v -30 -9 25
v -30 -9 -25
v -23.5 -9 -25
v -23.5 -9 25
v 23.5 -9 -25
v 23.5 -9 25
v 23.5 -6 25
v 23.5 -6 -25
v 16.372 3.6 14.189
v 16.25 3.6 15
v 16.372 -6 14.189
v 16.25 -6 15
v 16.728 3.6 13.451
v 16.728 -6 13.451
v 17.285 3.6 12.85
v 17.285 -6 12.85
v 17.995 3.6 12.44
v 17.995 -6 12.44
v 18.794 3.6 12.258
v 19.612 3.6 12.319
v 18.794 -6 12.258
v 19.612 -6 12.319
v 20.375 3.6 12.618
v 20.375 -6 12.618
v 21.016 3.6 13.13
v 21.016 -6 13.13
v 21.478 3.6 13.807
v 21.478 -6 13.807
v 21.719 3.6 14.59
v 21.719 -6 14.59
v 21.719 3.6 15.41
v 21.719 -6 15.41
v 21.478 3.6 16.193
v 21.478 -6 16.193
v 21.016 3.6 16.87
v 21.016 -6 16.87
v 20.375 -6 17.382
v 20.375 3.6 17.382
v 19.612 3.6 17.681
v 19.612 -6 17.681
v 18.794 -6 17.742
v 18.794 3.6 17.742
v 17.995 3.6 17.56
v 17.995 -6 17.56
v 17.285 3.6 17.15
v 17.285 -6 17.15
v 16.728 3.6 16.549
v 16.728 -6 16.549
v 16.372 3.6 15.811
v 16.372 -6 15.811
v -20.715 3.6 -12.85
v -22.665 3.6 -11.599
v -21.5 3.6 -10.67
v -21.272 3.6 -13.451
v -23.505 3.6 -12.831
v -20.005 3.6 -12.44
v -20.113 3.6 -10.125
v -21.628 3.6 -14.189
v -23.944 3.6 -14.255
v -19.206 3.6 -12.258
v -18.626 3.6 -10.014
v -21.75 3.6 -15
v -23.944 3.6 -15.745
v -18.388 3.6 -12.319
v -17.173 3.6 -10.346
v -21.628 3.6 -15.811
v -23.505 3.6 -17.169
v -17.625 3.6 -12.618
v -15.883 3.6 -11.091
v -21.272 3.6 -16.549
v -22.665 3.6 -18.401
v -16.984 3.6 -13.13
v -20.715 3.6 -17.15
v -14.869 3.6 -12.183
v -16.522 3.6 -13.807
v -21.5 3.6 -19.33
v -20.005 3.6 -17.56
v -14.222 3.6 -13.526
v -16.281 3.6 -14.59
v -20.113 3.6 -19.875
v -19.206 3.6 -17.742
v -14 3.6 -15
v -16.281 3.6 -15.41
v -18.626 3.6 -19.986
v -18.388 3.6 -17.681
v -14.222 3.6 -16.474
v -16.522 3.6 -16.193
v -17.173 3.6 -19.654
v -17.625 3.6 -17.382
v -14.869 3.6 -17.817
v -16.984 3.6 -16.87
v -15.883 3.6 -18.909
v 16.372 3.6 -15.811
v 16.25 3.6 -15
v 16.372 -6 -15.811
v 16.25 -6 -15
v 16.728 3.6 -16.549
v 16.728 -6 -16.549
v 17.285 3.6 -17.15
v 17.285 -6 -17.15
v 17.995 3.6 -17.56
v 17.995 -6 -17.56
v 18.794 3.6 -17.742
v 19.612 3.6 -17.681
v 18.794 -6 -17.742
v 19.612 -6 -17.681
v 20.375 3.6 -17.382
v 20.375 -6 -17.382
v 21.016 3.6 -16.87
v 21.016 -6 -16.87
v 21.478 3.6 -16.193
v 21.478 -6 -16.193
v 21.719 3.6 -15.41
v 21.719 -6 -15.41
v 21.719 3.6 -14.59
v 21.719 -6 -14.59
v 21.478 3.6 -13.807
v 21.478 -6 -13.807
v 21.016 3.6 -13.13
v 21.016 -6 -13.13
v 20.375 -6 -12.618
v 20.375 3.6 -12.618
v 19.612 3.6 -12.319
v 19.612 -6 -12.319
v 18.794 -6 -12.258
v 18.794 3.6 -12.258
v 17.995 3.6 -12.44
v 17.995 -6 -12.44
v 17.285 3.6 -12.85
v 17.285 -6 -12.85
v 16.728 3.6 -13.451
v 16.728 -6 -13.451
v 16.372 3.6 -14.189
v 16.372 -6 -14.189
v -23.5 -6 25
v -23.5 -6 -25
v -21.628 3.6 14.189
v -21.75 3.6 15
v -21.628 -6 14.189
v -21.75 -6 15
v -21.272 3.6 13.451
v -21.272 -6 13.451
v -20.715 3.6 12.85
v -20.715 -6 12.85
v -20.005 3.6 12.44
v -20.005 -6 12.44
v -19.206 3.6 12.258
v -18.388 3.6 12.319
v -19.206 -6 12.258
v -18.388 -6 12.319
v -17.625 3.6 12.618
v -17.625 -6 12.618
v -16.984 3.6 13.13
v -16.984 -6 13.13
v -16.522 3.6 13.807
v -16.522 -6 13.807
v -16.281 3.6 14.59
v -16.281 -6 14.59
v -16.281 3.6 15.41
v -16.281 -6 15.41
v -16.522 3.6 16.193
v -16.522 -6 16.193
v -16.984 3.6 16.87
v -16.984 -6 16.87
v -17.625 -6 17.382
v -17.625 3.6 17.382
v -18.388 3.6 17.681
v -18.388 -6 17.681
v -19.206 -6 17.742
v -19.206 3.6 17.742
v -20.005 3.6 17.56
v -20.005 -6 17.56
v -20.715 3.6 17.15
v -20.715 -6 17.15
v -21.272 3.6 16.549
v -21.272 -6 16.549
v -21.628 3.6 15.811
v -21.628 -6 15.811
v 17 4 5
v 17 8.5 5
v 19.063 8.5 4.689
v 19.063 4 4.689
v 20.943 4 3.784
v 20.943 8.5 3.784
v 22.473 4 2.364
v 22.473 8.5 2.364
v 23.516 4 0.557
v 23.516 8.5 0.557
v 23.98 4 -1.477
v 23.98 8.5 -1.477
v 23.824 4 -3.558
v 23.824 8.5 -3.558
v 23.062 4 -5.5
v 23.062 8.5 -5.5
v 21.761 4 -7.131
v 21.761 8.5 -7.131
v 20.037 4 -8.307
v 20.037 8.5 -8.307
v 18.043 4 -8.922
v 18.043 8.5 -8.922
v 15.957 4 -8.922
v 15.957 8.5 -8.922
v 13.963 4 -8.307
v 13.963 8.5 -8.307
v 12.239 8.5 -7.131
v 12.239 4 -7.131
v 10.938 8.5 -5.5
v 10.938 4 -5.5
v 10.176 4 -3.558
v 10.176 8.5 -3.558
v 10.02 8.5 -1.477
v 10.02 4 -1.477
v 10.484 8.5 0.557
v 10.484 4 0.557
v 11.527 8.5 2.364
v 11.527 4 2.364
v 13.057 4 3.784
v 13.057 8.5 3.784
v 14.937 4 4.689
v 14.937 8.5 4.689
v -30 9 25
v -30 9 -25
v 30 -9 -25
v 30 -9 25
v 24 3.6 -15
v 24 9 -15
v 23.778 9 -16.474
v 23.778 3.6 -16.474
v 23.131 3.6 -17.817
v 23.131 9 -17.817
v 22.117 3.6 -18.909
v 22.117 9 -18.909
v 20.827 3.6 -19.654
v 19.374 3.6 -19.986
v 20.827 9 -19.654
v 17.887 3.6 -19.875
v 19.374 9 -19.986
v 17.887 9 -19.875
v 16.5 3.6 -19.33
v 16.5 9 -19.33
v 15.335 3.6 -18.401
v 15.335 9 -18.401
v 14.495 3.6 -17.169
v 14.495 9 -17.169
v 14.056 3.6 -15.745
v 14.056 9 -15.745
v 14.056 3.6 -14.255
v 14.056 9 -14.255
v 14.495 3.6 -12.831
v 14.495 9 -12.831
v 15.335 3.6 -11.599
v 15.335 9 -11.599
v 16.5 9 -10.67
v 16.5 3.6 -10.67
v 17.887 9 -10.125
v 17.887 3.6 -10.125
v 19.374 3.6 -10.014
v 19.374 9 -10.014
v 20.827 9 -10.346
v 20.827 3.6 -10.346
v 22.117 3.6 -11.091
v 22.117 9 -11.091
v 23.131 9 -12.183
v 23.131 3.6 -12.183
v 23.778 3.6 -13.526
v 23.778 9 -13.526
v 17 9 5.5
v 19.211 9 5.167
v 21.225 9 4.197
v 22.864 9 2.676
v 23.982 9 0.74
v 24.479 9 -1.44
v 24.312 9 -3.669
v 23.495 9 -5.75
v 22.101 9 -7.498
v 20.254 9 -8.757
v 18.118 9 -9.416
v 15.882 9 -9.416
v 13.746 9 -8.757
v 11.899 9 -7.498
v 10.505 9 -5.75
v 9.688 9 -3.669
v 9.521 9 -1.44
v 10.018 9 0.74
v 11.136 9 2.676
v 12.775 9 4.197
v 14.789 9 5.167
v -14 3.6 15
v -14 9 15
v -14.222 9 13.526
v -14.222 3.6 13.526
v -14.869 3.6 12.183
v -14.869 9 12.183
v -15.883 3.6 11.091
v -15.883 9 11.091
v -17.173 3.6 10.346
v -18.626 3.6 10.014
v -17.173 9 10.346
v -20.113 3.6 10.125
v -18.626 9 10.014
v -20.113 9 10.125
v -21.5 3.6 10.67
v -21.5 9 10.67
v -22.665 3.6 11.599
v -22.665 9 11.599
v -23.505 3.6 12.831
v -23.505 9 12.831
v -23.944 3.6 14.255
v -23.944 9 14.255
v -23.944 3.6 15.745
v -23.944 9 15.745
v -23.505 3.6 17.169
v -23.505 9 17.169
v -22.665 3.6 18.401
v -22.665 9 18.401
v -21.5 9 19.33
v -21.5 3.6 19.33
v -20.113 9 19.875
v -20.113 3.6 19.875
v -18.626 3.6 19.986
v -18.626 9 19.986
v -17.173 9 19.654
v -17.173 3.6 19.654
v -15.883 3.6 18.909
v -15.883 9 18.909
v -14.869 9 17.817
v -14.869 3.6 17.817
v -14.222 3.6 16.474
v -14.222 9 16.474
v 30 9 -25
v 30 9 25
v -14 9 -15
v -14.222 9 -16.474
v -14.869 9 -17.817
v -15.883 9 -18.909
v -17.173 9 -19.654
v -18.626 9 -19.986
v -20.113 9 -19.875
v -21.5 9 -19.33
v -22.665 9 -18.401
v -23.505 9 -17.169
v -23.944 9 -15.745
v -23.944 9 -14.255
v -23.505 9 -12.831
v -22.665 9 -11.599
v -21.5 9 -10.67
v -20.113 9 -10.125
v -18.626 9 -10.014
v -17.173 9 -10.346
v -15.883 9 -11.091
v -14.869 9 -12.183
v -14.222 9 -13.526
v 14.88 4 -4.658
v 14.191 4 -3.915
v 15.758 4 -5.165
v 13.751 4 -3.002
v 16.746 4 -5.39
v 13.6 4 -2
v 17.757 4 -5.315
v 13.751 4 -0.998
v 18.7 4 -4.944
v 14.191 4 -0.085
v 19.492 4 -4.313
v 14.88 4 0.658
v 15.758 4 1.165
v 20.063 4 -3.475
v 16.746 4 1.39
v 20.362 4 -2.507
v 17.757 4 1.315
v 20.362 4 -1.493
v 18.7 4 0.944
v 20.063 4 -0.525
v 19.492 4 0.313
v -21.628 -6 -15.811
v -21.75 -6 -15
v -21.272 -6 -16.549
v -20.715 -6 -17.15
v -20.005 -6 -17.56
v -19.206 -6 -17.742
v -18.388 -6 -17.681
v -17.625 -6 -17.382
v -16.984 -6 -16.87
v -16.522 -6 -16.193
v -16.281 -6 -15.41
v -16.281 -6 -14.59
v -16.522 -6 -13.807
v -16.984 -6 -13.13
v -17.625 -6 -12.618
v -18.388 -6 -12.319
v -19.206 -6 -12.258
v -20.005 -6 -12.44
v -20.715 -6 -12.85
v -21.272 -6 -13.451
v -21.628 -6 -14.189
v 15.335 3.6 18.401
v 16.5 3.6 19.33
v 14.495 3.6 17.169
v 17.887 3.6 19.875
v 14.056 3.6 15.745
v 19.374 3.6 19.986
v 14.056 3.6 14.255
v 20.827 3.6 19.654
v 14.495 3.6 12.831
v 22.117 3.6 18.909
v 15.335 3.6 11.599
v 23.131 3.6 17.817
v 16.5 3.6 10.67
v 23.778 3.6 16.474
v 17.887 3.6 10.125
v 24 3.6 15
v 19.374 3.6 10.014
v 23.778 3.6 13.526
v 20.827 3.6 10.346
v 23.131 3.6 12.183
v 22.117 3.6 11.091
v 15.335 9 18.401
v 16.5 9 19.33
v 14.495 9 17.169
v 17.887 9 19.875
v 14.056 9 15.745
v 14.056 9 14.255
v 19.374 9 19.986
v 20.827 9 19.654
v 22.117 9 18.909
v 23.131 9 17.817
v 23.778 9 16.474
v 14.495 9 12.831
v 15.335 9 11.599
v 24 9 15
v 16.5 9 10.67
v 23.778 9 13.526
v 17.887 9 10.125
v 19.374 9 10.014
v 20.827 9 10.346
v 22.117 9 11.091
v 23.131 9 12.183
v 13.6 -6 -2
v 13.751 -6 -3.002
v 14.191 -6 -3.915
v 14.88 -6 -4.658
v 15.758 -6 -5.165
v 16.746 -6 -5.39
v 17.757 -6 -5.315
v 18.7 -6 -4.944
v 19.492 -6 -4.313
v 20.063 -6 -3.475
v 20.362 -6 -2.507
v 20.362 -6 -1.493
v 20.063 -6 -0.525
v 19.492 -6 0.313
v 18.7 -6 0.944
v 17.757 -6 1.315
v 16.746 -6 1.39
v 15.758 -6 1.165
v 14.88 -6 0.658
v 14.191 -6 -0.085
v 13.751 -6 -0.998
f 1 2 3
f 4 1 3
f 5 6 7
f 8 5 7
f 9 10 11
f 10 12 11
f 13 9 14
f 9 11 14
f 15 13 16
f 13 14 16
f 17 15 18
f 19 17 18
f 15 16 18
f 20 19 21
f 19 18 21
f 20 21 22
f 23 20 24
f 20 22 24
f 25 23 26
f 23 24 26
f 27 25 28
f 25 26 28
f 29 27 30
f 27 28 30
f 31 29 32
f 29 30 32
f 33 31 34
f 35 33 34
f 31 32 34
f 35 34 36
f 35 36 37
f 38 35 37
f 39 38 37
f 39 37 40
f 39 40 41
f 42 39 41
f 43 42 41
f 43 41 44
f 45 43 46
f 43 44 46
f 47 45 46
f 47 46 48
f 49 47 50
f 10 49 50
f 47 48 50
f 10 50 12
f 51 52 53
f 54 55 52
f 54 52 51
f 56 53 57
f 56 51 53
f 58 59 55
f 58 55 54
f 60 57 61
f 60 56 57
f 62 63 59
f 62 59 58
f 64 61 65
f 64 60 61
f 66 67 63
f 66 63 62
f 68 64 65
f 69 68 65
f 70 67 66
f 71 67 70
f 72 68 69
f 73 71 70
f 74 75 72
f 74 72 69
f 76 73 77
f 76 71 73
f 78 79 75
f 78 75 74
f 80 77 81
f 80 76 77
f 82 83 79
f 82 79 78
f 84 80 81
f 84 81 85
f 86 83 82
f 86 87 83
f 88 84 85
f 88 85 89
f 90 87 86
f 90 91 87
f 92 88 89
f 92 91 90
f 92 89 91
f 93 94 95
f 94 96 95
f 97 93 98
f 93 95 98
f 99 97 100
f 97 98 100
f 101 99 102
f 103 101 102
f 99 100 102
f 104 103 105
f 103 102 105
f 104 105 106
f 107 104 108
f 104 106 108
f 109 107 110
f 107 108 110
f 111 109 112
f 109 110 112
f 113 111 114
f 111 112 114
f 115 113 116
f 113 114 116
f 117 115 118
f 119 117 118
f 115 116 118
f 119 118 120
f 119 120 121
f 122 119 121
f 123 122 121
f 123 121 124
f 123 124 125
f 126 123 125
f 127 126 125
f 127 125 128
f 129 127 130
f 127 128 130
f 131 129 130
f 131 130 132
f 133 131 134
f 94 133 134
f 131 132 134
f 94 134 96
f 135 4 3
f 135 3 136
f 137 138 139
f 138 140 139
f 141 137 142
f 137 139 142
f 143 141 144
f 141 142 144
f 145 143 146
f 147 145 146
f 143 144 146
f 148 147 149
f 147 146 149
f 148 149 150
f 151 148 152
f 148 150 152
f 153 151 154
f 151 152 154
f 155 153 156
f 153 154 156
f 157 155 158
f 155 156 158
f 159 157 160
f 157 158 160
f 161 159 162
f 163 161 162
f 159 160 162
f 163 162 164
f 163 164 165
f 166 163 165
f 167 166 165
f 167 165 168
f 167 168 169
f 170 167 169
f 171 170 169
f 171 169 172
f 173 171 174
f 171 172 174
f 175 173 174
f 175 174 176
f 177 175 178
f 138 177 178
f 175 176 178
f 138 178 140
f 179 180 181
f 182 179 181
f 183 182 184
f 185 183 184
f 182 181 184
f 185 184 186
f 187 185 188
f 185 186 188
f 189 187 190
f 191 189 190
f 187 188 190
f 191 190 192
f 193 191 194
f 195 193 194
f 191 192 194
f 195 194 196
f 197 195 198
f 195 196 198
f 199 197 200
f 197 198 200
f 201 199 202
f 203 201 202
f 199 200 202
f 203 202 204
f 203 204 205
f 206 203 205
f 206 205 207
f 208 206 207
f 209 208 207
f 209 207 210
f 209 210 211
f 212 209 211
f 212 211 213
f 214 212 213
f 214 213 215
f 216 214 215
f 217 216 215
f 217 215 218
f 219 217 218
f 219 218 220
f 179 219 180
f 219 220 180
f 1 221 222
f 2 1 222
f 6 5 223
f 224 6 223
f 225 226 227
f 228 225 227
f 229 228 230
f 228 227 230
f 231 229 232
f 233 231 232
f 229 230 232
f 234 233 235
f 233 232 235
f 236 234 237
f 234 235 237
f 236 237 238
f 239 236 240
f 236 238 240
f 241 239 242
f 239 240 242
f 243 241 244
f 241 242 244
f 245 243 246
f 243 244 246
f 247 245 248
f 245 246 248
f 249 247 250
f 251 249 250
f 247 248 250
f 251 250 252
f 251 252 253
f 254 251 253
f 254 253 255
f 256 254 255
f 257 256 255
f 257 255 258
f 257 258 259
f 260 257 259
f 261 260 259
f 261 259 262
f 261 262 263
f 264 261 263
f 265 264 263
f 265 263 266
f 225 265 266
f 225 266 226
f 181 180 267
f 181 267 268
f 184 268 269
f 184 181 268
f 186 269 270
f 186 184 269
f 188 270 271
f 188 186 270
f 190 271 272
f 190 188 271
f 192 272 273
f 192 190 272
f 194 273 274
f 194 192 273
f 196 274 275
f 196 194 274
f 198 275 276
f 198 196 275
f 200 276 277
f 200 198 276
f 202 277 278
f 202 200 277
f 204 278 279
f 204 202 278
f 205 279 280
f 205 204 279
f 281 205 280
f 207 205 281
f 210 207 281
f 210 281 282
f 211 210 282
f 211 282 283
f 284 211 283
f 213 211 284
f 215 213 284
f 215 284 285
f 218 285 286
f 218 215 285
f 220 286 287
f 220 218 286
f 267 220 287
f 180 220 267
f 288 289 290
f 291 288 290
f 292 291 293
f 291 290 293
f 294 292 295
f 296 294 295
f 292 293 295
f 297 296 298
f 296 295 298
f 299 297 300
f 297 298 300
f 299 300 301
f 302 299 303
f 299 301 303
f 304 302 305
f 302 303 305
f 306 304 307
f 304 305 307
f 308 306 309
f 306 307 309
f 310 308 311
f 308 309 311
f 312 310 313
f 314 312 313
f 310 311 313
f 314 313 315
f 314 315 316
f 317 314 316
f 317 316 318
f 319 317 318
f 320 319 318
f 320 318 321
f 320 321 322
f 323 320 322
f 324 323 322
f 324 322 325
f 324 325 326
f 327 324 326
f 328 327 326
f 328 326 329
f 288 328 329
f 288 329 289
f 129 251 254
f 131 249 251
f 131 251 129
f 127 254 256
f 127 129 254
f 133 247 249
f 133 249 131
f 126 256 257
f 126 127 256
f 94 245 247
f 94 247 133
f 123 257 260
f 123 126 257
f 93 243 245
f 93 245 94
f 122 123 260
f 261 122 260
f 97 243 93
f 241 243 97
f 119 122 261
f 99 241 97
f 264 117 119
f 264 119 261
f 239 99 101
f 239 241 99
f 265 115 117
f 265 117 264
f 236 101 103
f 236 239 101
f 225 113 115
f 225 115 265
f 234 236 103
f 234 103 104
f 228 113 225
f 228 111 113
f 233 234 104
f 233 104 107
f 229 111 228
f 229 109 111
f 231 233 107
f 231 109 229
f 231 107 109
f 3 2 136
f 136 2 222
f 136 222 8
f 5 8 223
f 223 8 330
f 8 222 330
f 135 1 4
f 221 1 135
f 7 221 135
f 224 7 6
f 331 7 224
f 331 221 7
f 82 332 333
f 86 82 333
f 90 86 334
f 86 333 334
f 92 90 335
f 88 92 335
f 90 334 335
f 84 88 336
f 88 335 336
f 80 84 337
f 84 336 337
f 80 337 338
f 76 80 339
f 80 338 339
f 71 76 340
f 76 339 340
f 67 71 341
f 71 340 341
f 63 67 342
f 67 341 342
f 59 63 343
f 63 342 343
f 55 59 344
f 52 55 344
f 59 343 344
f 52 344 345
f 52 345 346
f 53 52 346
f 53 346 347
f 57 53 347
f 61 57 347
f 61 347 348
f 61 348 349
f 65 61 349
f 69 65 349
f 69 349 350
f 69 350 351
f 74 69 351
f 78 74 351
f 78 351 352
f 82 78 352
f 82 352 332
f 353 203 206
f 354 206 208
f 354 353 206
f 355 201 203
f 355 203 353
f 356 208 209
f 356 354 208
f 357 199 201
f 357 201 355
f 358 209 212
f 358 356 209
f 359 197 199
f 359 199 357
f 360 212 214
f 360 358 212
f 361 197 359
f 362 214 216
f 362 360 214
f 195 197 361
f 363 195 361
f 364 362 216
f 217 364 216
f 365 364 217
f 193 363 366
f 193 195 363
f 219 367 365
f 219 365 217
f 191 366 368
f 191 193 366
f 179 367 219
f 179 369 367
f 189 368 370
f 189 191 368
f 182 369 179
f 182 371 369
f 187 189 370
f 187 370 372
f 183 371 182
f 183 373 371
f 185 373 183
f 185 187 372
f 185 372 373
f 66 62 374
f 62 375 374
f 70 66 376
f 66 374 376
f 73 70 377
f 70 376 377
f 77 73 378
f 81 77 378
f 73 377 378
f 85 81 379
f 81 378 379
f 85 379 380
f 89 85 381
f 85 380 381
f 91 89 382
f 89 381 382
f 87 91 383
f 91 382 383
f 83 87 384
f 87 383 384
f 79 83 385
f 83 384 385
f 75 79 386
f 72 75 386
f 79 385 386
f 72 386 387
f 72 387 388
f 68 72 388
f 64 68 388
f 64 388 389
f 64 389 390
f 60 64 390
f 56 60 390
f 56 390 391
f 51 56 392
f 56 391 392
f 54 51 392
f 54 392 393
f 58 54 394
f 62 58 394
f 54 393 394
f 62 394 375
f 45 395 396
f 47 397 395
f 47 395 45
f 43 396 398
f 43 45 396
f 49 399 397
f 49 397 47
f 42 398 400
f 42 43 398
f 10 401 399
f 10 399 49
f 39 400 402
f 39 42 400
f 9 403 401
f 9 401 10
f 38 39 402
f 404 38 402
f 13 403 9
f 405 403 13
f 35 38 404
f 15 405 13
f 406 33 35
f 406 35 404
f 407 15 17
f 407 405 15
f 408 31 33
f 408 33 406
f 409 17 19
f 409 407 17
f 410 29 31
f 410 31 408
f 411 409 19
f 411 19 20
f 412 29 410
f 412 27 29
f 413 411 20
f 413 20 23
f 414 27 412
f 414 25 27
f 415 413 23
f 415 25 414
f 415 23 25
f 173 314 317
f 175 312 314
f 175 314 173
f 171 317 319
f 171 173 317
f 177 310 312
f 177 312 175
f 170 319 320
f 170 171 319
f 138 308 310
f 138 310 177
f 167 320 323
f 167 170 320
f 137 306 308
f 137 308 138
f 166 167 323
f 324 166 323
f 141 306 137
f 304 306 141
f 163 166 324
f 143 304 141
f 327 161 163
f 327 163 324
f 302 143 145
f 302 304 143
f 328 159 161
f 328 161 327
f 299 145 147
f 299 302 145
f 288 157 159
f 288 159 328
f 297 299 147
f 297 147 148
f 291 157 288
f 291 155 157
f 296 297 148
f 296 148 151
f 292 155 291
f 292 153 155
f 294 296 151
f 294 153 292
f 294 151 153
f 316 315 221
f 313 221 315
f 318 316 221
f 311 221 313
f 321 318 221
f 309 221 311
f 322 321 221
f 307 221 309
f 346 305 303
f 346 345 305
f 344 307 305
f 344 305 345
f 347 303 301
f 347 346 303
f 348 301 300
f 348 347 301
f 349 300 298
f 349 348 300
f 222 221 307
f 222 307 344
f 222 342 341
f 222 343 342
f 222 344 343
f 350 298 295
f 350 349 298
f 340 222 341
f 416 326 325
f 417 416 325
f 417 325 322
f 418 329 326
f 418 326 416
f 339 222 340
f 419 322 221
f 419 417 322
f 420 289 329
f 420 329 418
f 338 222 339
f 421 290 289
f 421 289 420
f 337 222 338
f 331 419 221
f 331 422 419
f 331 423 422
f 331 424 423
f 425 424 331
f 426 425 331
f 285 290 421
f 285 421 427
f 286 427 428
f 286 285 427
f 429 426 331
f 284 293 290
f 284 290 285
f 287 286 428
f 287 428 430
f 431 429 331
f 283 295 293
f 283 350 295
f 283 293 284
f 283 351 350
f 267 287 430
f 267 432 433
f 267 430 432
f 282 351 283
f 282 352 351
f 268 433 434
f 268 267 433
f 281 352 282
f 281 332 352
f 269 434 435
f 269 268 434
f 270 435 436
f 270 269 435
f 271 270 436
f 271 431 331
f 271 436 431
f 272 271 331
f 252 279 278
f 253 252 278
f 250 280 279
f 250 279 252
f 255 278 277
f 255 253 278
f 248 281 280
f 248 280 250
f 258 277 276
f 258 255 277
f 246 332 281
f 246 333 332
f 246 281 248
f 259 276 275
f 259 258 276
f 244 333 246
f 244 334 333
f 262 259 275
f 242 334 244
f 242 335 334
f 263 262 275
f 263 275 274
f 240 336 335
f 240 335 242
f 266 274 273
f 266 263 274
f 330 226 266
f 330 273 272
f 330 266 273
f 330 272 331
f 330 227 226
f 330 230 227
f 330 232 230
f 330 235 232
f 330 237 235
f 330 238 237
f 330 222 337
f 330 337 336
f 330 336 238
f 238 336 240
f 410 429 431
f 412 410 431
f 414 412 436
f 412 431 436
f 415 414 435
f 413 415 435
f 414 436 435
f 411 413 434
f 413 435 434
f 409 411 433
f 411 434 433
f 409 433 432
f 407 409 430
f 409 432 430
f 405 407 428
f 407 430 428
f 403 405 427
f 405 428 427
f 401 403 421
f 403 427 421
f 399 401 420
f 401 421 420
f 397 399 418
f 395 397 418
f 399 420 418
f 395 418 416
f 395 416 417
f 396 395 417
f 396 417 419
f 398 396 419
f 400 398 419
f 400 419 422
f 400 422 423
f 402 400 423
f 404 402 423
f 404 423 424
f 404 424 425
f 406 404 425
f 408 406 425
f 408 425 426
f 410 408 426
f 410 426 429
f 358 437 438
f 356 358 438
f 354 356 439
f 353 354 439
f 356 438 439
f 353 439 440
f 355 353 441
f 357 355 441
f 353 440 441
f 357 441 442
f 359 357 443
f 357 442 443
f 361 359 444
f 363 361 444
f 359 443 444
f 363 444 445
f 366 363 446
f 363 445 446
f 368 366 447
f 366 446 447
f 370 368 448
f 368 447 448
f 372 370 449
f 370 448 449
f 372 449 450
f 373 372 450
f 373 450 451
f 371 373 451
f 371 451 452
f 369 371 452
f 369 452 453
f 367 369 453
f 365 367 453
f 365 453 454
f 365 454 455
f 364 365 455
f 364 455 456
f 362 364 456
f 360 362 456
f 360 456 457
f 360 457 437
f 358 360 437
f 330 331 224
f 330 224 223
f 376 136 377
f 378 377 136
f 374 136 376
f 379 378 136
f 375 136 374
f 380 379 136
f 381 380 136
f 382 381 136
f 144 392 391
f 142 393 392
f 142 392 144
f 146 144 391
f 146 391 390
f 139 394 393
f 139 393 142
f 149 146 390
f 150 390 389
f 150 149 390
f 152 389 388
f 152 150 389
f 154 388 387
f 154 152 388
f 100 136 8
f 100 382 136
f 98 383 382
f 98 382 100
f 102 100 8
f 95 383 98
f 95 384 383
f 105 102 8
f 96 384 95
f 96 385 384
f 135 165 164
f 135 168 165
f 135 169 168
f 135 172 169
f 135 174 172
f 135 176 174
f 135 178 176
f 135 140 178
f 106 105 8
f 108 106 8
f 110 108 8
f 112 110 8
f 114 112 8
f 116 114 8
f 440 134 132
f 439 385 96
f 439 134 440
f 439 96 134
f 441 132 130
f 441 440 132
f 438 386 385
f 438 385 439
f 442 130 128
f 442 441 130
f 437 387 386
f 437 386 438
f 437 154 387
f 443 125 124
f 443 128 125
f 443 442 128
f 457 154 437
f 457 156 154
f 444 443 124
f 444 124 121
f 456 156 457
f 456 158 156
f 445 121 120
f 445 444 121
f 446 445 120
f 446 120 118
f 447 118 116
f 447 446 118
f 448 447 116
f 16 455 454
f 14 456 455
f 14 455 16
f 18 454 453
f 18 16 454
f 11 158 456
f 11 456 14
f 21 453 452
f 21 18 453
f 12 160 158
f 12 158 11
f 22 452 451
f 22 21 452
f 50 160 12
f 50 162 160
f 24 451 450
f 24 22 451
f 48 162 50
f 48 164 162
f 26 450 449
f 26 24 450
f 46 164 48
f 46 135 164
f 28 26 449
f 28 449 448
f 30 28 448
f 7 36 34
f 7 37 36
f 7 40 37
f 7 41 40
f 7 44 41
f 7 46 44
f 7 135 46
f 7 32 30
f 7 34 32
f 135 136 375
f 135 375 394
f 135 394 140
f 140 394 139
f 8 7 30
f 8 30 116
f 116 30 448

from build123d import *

# Parameters (mm, degrees)
SKETCH1_W                                           = 60
SKETCH1_H                                           = 50
BOSS_EXTRUDE1_DEPTH                                 = 9
SKETCH2_W                                           = 47
SKETCH2_H                                           = 6
CUT_EXTRUDE1_DEPTH                                  = 60
CBORE_FOR_M5_HEX_SOCKET_HEAD_CAP_SCREW1_D           = 5.5
CBORE_FOR_M5_HEX_SOCKET_HEAD_CAP_SCREW1_CBORE_D     = 10
CBORE_FOR_M5_HEX_SOCKET_HEAD_CAP_SCREW1_CBORE_DEPTH = 5.4
M8_TAPPED_HOLE1_D                                   = 6.8
SKETCH9_R                                           = 7
CUT_EXTRUDE2_DEPTH                                  = 5
CHAMFER1_SIZE                                       = 0.5


with BuildPart() as part:
    # Sketch1 → Boss-Extrude1 (new, symmetric)
    with BuildSketch(Plane(origin=(0, 0, 0), x_dir=(1, 0, 0), z_dir=(0, 1, 0))):
        Rectangle(SKETCH1_W, SKETCH1_H)
    extrude(amount=BOSS_EXTRUDE1_DEPTH, both=True)

    # Sketch2 → Cut-Extrude1 (cut, through all)
    with BuildSketch(Plane.XY.offset(25)):
        with Locations((0, -9)):
            Rectangle(SKETCH2_W, SKETCH2_H)
    extrude(amount=-CUT_EXTRUDE1_DEPTH, mode=Mode.SUBTRACT)

    # CBORE for M5 Hex Socket Head Cap Screw1 (through all)
    with Locations(Plane(origin=(0, 9, 0), x_dir=(1, 0, 0), z_dir=(0, 1, 0))):
        with Locations((-19, 15), (19, 15), (19, -15), (-19, -15)):
            CounterBoreHole(CBORE_FOR_M5_HEX_SOCKET_HEAD_CAP_SCREW1_D / 2, CBORE_FOR_M5_HEX_SOCKET_HEAD_CAP_SCREW1_CBORE_D / 2, CBORE_FOR_M5_HEX_SOCKET_HEAD_CAP_SCREW1_CBORE_DEPTH)

    # M8 Tapped Hole1 (through all)
    with Locations(Plane(origin=(0, 9, 0), x_dir=(1, 0, 0), z_dir=(0, 1, 0))):
        with Locations((17, 2)):
            Hole(M8_TAPPED_HOLE1_D / 2)

    # Sketch9 → Cut-Extrude2 (cut)
    with BuildSketch(Plane(origin=(0, 9, 0), x_dir=(1, 0, 0), z_dir=(0, 1, 0))):
        with Locations(Location((17, 2, 0), (0, 0, 270))):
            Circle(SKETCH9_R)
    extrude(amount=-CUT_EXTRUDE2_DEPTH, mode=Mode.SUBTRACT)

    # Chamfer1
    chamfer1_edges = [part.edges().sort_by_distance(p)[0] for p in [
        (17, 9, -9),
    ]]
    chamfer(chamfer1_edges, length=CHAMFER1_SIZE)


solid = part.part
